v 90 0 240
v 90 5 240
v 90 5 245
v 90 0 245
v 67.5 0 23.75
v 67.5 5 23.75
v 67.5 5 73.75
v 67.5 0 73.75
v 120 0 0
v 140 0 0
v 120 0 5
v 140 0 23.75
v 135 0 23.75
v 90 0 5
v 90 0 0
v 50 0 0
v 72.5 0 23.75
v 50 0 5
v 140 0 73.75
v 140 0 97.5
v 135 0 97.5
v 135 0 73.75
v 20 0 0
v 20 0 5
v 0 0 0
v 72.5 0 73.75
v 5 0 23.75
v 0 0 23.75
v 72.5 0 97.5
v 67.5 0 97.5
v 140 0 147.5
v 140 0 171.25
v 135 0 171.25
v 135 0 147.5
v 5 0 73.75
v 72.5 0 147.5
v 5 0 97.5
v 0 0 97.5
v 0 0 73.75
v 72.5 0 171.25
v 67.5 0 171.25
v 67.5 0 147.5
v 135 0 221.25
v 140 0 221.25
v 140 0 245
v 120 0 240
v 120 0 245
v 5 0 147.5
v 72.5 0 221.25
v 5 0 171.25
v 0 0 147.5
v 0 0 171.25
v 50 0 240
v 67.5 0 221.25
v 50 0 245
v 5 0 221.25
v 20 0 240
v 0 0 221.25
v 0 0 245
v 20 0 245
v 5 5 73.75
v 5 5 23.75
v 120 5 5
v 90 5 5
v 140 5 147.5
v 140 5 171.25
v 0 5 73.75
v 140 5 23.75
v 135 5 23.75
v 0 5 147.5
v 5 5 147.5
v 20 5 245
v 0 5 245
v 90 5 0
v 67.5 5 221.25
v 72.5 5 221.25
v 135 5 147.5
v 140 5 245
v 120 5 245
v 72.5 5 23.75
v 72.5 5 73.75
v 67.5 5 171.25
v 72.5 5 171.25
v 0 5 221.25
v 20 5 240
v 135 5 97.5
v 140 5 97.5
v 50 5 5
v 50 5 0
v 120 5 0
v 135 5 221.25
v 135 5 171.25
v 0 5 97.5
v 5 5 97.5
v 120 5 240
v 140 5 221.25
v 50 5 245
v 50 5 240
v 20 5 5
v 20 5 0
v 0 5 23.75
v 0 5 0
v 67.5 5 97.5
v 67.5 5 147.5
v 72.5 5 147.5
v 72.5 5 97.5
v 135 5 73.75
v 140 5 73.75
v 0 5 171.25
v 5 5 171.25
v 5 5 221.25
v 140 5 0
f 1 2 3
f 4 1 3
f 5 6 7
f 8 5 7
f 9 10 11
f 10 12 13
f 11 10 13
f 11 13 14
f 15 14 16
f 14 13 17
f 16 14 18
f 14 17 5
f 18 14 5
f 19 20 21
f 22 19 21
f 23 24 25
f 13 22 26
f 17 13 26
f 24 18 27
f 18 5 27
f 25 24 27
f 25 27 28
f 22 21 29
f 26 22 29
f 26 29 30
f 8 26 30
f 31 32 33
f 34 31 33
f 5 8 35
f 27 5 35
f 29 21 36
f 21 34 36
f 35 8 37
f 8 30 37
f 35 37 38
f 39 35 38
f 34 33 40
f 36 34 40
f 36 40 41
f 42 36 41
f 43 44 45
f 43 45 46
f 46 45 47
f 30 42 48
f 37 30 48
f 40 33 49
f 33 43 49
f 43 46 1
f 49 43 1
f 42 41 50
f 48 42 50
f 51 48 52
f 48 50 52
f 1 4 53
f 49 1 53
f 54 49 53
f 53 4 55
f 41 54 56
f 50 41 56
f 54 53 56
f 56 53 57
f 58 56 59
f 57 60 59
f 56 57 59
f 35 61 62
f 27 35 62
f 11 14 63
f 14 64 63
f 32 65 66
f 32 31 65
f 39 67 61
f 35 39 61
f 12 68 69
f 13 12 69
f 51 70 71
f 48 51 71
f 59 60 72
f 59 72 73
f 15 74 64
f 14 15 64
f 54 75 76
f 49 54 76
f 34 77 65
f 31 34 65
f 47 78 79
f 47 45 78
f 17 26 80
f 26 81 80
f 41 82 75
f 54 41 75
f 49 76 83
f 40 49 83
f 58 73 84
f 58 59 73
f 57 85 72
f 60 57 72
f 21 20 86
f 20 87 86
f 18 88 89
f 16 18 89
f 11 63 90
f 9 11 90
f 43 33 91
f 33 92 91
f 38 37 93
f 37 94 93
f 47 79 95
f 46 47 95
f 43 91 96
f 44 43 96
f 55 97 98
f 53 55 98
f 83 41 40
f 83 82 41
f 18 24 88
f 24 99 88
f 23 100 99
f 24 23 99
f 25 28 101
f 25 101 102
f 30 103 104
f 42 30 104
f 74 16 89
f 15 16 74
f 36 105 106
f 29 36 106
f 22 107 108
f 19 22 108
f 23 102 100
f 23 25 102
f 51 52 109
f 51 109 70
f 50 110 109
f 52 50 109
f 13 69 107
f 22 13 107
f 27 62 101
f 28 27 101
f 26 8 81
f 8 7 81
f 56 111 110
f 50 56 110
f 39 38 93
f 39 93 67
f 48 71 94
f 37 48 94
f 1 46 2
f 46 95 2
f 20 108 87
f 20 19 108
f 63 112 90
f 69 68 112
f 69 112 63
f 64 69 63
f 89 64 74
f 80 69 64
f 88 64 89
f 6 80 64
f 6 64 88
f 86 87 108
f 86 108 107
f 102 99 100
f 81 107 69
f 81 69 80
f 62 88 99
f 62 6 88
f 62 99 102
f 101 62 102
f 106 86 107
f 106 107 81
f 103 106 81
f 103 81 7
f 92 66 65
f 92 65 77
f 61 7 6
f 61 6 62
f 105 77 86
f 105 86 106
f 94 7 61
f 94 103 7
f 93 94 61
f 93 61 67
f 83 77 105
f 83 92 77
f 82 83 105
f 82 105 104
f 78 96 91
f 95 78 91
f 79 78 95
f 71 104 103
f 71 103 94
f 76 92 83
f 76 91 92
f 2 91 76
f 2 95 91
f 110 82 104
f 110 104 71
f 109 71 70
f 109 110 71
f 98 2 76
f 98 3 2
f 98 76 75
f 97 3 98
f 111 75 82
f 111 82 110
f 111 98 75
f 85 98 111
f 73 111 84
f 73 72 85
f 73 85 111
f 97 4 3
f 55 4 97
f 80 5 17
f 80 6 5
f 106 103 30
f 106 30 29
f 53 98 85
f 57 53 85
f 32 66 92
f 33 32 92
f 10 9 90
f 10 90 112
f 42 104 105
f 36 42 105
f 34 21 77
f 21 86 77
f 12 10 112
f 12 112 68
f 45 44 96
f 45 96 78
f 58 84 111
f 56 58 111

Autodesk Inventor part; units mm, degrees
ref_plane "YZ Plane" through (0, 0, 0) normal (1, 0, 0) x (0, 1, 0)
ref_plane "XZ Plane" through (0, 0, 0) normal (0, 1, 0) x (-1, 0, 0)
ref_plane "XY Plane" through (0, 0, 0) normal (0, 0, 1) x (1, 0, 0)
sketch "Sketch1" plane through (0, 0, 0) normal (0, 1, 0) x (-1, 0, 0)
  line L0 (0, 0) -> (-140, 0)
  line L1 (-140, 0) -> (-140, 245)
  line L2 (-140, 245) -> (0, 245)
  line L3 (0, 245) -> (0, 0)
  dimension "d0" = 140
  dimension "d1" = 245
extrude "Extrusion1" add sketch "Sketch1" along normal blind 5
sketch "Sketch2" plane through (0, 5, 0) normal (0, 1, 0) x (1, 0, 0)
  line L0 (0, -245) -> (140, -245) projected
  line L1 (140, -245) -> (140, 0) projected
  line L2 (140, 0) -> (0, 0) projected
  line L3 (0, 0) -> (0, -245) projected
  line L4 (135, -73.75) -> (140, -73.75)
  line L5 (140, -73.75) -> (140, -23.75)
  line L6 (140, -23.75) -> (135, -23.75)
  line L7 (135, -23.75) -> (135, -73.75)
  line L8 (135, -221.25) -> (140, -221.25)
  line L9 (140, -221.25) -> (140, -171.25)
  line L10 (140, -171.25) -> (135, -171.25)
  line L11 (135, -171.25) -> (135, -221.25)
  line L12 (135, -147.5) -> (140, -147.5)
  line L13 (140, -147.5) -> (140, -97.5)
  line L14 (140, -97.5) -> (135, -97.5)
  line L15 (135, -97.5) -> (135, -147.5)
  line L16 (0, -73.75) -> (5, -73.75)
  line L17 (5, -73.75) -> (5, -23.75)
  line L18 (5, -23.75) -> (0, -23.75)
  line L19 (0, -23.75) -> (0, -73.75)
  line L20 (0, -221.25) -> (5, -221.25)
  line L21 (5, -221.25) -> (5, -171.25)
  line L22 (5, -171.25) -> (0, -171.25)
  line L23 (0, -171.25) -> (0, -221.25)
  line L24 (0, -147.5) -> (5, -147.5)
  line L25 (5, -147.5) -> (5, -97.5)
  line L26 (5, -97.5) -> (0, -97.5)
  line L27 (0, -97.5) -> (0, -147.5)
  line L28 (20, -245) -> (50, -245)
  line L29 (50, -245) -> (50, -240)
  line L30 (50, -240) -> (20, -240)
  line L31 (20, -240) -> (20, -245)
  line L32 (90, -245) -> (120, -245)
  line L33 (120, -245) -> (120, -240)
  line L34 (120, -240) -> (90, -240)
  line L35 (90, -240) -> (90, -245)
  line L36 (20, -5) -> (50, -5)
  line L37 (50, -5) -> (50, 0)
  line L38 (50, 0) -> (20, 0)
  line L39 (20, 0) -> (20, -5)
  line L40 (120, 0) -> (90, 0)
  line L41 (90, 0) -> (90, -5)
  line L42 (90, -5) -> (120, -5)
  line L43 (120, -5) -> (120, 0)
  point P0 (140, -23.75)
  dimension "d4" = 50
  dimension "d5" = 5
  dimension "d6" = 50
  dimension "d7" = 5
  dimension "d8" = 50
  dimension "d9" = 5
  dimension "d10" = 23.75
  dimension "d11" = 23.75
  dimension "d12" = 23.75
  dimension "d13" = 50
  dimension "d14" = 5
  dimension "d15" = 50
  dimension "d16" = 5
  dimension "d17" = 50
  dimension "d18" = 5
  dimension "d19" = 23.75
  dimension "d20" = 23.75
  dimension "d21" = 23.75
  dimension "d22" = 20
  dimension "d23" = 5
  dimension "d25" = 30
  dimension "d26" = 5
  dimension "d27" = 30
  dimension "d28" = 5
  dimension "d29" = 30
  dimension "d30" = 5
  dimension "d31" = 30
  dimension "d32" = 20
  dimension "d33" = 20
  dimension "d34" = 20
extrude "Extrusion2" cut sketch "Sketch2" against normal blind 5 contours L31 L30 L29 L0 | L3 L22 L21 L20 | L35 L34 L33 L0 | L3 L26 L25 L24 | L3 L18 L17 L16 | L8 L11 L10 L1 | L12 L15 L14 L1 | L2 L37 L36 L39 | L4 L7 L6 L1 | L2 L43 L42 L41
sketch "Sketch3" plane through (0, 5, 0) normal (0, 1, 0) x (1, 0, 0)
  line L0 (0, -147.5) -> (5, -147.5) projected
  line L1 (5, -147.5) -> (5, -97.5) projected
  line L2 (5, -97.5) -> (0, -97.5) projected
  line L3 (0, -73.75) -> (0, -97.5) projected
  line L4 (0, -73.75) -> (5, -73.75) projected
  line L5 (5, -73.75) -> (5, -23.75) projected
  line L6 (5, -23.75) -> (0, -23.75) projected
  line L7 (0, 0) -> (0, -23.75) projected
  line L8 (20, 0) -> (0, 0) projected
  line L9 (20, 0) -> (20, -5) projected
  line L10 (20, -5) -> (50, -5) projected
  line L11 (50, -5) -> (50, 0) projected
  line L12 (90, 0) -> (50, 0) projected
  line L13 (90, 0) -> (90, -5) projected
  line L14 (90, -5) -> (120, -5) projected
  line L15 (120, -5) -> (120, 0) projected
  line L16 (140, 0) -> (120, 0) projected
  line L17 (140, -23.75) -> (140, 0) projected
  line L18 (140, -23.75) -> (135, -23.75) projected
  line L19 (135, -23.75) -> (135, -73.75) projected
  line L20 (135, -73.75) -> (140, -73.75) projected
  line L21 (140, -97.5) -> (140, -73.75) projected
  line L22 (140, -97.5) -> (135, -97.5) projected
  line L23 (135, -97.5) -> (135, -147.5) projected
  line L24 (135, -147.5) -> (140, -147.5) projected
  line L25 (140, -171.25) -> (140, -147.5) projected
  line L26 (140, -171.25) -> (135, -171.25) projected
  line L27 (135, -171.25) -> (135, -221.25) projected
  line L28 (135, -221.25) -> (140, -221.25) projected
  line L29 (140, -245) -> (140, -221.25) projected
  line L30 (120, -245) -> (140, -245) projected
  line L31 (120, -245) -> (120, -240) projected
  line L32 (120, -240) -> (90, -240) projected
  line L33 (90, -240) -> (90, -245) projected
  line L34 (50, -245) -> (90, -245) projected
  line L35 (50, -245) -> (50, -240) projected
  line L36 (50, -240) -> (20, -240) projected
  line L37 (20, -240) -> (20, -245) projected
  line L38 (0, -245) -> (20, -245) projected
  line L39 (0, -221.25) -> (0, -245) projected
  line L40 (0, -221.25) -> (5, -221.25) projected
  line L41 (5, -221.25) -> (5, -171.25) projected
  line L42 (5, -171.25) -> (0, -171.25) projected
  line L43 (0, -147.5) -> (0, -171.25) projected
  line L44 (135, -171.25) -> (135, -221.25) construction
  line L45 (135, -186.5648) -> (72.5, -186.5648) construction
  line L46 (67.5, -245) -> (72.5, -245)
  line L47 (72.5, 0) -> (67.5, 0)
  line L48 (67.5, -221.25) -> (72.5, -221.25)
  line L49 (67.5, -171.25) -> (72.5, -171.25)
  line L50 (67.5, -73.75) -> (72.5, -73.75)
  line L51 (67.5, -23.75) -> (72.5, -23.75)
  line L52 (67.5, -147.5) -> (72.5, -147.5)
  line L53 (67.5, -97.5) -> (72.5, -97.5)
  line L54 (67.5, -171.25) -> (67.5, -221.25)
  line L55 (72.5, -221.25) -> (72.5, -171.25)
  line L56 (72.5, -147.5) -> (72.5, -97.5)
  line L57 (72.5, -73.75) -> (72.5, -23.75)
  line L58 (67.5, -23.75) -> (67.5, -73.75)
  line L59 (67.5, -97.5) -> (67.5, -147.5)
  dimension "d37" = 62.5
  dimension "d39" = 23.75
  dimension "d40" = 50
  dimension "d41" = 23.75
  dimension "d42" = 50
  dimension "d43" = 50
  dimension "d44" = 23.75
  dimension "d45" = 5
extrude "Extrusion3" cut sketch "Sketch3" against normal blind 5 contours L54 L49 L55 L48 | L58 L51 L57 L50 | L59 L53 L56 L52
properties part number "Lateral 1"
